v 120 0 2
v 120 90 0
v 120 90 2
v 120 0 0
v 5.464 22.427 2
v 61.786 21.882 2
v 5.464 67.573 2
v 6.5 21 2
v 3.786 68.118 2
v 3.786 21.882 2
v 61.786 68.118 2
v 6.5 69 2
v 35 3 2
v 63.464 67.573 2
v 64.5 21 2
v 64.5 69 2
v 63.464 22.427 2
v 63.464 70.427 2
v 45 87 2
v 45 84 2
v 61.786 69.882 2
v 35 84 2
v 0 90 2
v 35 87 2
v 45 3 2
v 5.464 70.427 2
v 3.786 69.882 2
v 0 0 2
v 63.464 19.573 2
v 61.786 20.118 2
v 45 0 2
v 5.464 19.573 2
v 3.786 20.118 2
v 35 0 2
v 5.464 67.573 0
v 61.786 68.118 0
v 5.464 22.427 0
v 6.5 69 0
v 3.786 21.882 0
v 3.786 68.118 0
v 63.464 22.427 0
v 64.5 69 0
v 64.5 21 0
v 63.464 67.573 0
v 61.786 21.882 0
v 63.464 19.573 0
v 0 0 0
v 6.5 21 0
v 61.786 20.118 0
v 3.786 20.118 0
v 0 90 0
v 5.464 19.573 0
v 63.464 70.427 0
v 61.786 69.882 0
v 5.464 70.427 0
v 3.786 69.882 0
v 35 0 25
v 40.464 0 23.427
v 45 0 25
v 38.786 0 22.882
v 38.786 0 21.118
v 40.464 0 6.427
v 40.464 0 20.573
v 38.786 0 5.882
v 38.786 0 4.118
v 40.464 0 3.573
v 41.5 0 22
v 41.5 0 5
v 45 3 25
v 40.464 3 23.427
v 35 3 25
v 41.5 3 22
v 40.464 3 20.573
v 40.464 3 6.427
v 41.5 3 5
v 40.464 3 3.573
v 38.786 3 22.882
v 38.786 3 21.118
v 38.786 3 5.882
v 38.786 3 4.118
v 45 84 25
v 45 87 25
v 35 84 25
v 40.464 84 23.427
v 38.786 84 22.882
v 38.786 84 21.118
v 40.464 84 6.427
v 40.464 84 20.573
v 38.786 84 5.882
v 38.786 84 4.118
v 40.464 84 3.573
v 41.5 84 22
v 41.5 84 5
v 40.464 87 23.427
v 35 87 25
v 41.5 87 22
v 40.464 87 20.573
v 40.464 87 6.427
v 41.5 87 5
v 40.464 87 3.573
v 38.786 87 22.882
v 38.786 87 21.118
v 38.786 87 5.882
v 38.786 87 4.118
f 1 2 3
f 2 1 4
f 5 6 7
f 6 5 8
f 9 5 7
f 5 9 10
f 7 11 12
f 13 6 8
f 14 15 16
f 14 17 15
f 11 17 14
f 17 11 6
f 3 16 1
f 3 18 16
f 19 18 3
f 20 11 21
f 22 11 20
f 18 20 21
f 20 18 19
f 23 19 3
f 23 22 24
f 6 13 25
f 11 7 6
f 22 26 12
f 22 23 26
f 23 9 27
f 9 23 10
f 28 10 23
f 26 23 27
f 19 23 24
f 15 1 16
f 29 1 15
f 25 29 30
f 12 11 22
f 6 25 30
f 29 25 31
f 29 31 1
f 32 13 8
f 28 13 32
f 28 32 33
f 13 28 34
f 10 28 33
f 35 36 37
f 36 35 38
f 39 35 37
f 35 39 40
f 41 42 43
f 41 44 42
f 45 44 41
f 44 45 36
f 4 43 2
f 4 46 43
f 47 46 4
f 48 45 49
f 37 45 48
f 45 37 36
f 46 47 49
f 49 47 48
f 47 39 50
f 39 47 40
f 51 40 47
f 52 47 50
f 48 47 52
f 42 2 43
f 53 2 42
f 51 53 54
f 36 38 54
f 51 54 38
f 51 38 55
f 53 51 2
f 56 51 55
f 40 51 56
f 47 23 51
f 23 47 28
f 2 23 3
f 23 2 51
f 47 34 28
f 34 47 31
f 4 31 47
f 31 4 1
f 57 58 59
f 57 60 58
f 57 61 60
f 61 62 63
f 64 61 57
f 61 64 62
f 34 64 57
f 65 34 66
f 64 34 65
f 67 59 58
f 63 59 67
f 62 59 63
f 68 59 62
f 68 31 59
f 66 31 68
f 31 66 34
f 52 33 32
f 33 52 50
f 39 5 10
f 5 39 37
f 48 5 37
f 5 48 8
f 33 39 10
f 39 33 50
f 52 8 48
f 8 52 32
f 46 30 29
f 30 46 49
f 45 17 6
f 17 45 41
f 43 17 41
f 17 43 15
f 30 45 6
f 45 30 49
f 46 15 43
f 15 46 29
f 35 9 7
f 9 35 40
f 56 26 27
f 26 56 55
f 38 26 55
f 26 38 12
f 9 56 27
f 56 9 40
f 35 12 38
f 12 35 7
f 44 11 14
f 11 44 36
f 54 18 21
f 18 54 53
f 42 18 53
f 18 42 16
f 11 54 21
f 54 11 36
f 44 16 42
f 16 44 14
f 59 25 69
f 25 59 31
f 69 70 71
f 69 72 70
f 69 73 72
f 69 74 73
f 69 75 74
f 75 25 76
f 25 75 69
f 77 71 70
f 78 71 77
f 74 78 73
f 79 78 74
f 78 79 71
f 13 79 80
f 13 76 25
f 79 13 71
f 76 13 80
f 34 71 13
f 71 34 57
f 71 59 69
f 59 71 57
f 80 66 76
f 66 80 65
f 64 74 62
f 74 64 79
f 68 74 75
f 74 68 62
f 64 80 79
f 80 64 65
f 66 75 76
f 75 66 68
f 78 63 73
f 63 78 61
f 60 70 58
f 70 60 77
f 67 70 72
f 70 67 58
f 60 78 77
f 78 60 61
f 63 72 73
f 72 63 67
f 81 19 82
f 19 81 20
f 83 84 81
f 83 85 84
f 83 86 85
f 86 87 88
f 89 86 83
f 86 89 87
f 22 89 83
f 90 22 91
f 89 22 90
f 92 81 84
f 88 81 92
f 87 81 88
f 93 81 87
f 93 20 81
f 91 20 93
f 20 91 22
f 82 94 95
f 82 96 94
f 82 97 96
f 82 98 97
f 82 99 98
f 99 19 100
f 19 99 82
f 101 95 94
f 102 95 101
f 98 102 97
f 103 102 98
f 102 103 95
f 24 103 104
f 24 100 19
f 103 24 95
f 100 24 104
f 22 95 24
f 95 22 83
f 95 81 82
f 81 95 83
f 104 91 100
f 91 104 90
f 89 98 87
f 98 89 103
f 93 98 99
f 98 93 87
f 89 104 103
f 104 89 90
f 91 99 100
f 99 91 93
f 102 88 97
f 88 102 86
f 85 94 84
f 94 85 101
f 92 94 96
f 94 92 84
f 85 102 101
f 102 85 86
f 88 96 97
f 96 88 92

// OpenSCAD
difference(){
   cube([120,90,2]);
    
    translate([5,21,0]){
        cylinder(d=3,h=3);}
    translate([63,21,0]){
        cylinder(d=3,h=3);}
        
    translate([5,69,0]){
        cylinder(d=3,h=3);}
    translate([63,69,0]){
        cylinder(d=3,h=3);}
   
    }


translate([35,3,0]){
    rotate([90,0,0]){
    difference(){
        cube([10,25,3]);
        translate([5,5,0]){
        cylinder(h = 3,d = 3);}
        translate([5,22,0]){
            cylinder(h=3,d=3);}
        }
    }
}

translate([35,87,0]){
    rotate([90,0,0]){
    difference(){
        cube([10,25,3]);
        translate([5,5,0]){
        cylinder(h = 3,d = 3);}
        translate([5,22,0]){
            cylinder(h=3,d=3);}
        }
    }
}
